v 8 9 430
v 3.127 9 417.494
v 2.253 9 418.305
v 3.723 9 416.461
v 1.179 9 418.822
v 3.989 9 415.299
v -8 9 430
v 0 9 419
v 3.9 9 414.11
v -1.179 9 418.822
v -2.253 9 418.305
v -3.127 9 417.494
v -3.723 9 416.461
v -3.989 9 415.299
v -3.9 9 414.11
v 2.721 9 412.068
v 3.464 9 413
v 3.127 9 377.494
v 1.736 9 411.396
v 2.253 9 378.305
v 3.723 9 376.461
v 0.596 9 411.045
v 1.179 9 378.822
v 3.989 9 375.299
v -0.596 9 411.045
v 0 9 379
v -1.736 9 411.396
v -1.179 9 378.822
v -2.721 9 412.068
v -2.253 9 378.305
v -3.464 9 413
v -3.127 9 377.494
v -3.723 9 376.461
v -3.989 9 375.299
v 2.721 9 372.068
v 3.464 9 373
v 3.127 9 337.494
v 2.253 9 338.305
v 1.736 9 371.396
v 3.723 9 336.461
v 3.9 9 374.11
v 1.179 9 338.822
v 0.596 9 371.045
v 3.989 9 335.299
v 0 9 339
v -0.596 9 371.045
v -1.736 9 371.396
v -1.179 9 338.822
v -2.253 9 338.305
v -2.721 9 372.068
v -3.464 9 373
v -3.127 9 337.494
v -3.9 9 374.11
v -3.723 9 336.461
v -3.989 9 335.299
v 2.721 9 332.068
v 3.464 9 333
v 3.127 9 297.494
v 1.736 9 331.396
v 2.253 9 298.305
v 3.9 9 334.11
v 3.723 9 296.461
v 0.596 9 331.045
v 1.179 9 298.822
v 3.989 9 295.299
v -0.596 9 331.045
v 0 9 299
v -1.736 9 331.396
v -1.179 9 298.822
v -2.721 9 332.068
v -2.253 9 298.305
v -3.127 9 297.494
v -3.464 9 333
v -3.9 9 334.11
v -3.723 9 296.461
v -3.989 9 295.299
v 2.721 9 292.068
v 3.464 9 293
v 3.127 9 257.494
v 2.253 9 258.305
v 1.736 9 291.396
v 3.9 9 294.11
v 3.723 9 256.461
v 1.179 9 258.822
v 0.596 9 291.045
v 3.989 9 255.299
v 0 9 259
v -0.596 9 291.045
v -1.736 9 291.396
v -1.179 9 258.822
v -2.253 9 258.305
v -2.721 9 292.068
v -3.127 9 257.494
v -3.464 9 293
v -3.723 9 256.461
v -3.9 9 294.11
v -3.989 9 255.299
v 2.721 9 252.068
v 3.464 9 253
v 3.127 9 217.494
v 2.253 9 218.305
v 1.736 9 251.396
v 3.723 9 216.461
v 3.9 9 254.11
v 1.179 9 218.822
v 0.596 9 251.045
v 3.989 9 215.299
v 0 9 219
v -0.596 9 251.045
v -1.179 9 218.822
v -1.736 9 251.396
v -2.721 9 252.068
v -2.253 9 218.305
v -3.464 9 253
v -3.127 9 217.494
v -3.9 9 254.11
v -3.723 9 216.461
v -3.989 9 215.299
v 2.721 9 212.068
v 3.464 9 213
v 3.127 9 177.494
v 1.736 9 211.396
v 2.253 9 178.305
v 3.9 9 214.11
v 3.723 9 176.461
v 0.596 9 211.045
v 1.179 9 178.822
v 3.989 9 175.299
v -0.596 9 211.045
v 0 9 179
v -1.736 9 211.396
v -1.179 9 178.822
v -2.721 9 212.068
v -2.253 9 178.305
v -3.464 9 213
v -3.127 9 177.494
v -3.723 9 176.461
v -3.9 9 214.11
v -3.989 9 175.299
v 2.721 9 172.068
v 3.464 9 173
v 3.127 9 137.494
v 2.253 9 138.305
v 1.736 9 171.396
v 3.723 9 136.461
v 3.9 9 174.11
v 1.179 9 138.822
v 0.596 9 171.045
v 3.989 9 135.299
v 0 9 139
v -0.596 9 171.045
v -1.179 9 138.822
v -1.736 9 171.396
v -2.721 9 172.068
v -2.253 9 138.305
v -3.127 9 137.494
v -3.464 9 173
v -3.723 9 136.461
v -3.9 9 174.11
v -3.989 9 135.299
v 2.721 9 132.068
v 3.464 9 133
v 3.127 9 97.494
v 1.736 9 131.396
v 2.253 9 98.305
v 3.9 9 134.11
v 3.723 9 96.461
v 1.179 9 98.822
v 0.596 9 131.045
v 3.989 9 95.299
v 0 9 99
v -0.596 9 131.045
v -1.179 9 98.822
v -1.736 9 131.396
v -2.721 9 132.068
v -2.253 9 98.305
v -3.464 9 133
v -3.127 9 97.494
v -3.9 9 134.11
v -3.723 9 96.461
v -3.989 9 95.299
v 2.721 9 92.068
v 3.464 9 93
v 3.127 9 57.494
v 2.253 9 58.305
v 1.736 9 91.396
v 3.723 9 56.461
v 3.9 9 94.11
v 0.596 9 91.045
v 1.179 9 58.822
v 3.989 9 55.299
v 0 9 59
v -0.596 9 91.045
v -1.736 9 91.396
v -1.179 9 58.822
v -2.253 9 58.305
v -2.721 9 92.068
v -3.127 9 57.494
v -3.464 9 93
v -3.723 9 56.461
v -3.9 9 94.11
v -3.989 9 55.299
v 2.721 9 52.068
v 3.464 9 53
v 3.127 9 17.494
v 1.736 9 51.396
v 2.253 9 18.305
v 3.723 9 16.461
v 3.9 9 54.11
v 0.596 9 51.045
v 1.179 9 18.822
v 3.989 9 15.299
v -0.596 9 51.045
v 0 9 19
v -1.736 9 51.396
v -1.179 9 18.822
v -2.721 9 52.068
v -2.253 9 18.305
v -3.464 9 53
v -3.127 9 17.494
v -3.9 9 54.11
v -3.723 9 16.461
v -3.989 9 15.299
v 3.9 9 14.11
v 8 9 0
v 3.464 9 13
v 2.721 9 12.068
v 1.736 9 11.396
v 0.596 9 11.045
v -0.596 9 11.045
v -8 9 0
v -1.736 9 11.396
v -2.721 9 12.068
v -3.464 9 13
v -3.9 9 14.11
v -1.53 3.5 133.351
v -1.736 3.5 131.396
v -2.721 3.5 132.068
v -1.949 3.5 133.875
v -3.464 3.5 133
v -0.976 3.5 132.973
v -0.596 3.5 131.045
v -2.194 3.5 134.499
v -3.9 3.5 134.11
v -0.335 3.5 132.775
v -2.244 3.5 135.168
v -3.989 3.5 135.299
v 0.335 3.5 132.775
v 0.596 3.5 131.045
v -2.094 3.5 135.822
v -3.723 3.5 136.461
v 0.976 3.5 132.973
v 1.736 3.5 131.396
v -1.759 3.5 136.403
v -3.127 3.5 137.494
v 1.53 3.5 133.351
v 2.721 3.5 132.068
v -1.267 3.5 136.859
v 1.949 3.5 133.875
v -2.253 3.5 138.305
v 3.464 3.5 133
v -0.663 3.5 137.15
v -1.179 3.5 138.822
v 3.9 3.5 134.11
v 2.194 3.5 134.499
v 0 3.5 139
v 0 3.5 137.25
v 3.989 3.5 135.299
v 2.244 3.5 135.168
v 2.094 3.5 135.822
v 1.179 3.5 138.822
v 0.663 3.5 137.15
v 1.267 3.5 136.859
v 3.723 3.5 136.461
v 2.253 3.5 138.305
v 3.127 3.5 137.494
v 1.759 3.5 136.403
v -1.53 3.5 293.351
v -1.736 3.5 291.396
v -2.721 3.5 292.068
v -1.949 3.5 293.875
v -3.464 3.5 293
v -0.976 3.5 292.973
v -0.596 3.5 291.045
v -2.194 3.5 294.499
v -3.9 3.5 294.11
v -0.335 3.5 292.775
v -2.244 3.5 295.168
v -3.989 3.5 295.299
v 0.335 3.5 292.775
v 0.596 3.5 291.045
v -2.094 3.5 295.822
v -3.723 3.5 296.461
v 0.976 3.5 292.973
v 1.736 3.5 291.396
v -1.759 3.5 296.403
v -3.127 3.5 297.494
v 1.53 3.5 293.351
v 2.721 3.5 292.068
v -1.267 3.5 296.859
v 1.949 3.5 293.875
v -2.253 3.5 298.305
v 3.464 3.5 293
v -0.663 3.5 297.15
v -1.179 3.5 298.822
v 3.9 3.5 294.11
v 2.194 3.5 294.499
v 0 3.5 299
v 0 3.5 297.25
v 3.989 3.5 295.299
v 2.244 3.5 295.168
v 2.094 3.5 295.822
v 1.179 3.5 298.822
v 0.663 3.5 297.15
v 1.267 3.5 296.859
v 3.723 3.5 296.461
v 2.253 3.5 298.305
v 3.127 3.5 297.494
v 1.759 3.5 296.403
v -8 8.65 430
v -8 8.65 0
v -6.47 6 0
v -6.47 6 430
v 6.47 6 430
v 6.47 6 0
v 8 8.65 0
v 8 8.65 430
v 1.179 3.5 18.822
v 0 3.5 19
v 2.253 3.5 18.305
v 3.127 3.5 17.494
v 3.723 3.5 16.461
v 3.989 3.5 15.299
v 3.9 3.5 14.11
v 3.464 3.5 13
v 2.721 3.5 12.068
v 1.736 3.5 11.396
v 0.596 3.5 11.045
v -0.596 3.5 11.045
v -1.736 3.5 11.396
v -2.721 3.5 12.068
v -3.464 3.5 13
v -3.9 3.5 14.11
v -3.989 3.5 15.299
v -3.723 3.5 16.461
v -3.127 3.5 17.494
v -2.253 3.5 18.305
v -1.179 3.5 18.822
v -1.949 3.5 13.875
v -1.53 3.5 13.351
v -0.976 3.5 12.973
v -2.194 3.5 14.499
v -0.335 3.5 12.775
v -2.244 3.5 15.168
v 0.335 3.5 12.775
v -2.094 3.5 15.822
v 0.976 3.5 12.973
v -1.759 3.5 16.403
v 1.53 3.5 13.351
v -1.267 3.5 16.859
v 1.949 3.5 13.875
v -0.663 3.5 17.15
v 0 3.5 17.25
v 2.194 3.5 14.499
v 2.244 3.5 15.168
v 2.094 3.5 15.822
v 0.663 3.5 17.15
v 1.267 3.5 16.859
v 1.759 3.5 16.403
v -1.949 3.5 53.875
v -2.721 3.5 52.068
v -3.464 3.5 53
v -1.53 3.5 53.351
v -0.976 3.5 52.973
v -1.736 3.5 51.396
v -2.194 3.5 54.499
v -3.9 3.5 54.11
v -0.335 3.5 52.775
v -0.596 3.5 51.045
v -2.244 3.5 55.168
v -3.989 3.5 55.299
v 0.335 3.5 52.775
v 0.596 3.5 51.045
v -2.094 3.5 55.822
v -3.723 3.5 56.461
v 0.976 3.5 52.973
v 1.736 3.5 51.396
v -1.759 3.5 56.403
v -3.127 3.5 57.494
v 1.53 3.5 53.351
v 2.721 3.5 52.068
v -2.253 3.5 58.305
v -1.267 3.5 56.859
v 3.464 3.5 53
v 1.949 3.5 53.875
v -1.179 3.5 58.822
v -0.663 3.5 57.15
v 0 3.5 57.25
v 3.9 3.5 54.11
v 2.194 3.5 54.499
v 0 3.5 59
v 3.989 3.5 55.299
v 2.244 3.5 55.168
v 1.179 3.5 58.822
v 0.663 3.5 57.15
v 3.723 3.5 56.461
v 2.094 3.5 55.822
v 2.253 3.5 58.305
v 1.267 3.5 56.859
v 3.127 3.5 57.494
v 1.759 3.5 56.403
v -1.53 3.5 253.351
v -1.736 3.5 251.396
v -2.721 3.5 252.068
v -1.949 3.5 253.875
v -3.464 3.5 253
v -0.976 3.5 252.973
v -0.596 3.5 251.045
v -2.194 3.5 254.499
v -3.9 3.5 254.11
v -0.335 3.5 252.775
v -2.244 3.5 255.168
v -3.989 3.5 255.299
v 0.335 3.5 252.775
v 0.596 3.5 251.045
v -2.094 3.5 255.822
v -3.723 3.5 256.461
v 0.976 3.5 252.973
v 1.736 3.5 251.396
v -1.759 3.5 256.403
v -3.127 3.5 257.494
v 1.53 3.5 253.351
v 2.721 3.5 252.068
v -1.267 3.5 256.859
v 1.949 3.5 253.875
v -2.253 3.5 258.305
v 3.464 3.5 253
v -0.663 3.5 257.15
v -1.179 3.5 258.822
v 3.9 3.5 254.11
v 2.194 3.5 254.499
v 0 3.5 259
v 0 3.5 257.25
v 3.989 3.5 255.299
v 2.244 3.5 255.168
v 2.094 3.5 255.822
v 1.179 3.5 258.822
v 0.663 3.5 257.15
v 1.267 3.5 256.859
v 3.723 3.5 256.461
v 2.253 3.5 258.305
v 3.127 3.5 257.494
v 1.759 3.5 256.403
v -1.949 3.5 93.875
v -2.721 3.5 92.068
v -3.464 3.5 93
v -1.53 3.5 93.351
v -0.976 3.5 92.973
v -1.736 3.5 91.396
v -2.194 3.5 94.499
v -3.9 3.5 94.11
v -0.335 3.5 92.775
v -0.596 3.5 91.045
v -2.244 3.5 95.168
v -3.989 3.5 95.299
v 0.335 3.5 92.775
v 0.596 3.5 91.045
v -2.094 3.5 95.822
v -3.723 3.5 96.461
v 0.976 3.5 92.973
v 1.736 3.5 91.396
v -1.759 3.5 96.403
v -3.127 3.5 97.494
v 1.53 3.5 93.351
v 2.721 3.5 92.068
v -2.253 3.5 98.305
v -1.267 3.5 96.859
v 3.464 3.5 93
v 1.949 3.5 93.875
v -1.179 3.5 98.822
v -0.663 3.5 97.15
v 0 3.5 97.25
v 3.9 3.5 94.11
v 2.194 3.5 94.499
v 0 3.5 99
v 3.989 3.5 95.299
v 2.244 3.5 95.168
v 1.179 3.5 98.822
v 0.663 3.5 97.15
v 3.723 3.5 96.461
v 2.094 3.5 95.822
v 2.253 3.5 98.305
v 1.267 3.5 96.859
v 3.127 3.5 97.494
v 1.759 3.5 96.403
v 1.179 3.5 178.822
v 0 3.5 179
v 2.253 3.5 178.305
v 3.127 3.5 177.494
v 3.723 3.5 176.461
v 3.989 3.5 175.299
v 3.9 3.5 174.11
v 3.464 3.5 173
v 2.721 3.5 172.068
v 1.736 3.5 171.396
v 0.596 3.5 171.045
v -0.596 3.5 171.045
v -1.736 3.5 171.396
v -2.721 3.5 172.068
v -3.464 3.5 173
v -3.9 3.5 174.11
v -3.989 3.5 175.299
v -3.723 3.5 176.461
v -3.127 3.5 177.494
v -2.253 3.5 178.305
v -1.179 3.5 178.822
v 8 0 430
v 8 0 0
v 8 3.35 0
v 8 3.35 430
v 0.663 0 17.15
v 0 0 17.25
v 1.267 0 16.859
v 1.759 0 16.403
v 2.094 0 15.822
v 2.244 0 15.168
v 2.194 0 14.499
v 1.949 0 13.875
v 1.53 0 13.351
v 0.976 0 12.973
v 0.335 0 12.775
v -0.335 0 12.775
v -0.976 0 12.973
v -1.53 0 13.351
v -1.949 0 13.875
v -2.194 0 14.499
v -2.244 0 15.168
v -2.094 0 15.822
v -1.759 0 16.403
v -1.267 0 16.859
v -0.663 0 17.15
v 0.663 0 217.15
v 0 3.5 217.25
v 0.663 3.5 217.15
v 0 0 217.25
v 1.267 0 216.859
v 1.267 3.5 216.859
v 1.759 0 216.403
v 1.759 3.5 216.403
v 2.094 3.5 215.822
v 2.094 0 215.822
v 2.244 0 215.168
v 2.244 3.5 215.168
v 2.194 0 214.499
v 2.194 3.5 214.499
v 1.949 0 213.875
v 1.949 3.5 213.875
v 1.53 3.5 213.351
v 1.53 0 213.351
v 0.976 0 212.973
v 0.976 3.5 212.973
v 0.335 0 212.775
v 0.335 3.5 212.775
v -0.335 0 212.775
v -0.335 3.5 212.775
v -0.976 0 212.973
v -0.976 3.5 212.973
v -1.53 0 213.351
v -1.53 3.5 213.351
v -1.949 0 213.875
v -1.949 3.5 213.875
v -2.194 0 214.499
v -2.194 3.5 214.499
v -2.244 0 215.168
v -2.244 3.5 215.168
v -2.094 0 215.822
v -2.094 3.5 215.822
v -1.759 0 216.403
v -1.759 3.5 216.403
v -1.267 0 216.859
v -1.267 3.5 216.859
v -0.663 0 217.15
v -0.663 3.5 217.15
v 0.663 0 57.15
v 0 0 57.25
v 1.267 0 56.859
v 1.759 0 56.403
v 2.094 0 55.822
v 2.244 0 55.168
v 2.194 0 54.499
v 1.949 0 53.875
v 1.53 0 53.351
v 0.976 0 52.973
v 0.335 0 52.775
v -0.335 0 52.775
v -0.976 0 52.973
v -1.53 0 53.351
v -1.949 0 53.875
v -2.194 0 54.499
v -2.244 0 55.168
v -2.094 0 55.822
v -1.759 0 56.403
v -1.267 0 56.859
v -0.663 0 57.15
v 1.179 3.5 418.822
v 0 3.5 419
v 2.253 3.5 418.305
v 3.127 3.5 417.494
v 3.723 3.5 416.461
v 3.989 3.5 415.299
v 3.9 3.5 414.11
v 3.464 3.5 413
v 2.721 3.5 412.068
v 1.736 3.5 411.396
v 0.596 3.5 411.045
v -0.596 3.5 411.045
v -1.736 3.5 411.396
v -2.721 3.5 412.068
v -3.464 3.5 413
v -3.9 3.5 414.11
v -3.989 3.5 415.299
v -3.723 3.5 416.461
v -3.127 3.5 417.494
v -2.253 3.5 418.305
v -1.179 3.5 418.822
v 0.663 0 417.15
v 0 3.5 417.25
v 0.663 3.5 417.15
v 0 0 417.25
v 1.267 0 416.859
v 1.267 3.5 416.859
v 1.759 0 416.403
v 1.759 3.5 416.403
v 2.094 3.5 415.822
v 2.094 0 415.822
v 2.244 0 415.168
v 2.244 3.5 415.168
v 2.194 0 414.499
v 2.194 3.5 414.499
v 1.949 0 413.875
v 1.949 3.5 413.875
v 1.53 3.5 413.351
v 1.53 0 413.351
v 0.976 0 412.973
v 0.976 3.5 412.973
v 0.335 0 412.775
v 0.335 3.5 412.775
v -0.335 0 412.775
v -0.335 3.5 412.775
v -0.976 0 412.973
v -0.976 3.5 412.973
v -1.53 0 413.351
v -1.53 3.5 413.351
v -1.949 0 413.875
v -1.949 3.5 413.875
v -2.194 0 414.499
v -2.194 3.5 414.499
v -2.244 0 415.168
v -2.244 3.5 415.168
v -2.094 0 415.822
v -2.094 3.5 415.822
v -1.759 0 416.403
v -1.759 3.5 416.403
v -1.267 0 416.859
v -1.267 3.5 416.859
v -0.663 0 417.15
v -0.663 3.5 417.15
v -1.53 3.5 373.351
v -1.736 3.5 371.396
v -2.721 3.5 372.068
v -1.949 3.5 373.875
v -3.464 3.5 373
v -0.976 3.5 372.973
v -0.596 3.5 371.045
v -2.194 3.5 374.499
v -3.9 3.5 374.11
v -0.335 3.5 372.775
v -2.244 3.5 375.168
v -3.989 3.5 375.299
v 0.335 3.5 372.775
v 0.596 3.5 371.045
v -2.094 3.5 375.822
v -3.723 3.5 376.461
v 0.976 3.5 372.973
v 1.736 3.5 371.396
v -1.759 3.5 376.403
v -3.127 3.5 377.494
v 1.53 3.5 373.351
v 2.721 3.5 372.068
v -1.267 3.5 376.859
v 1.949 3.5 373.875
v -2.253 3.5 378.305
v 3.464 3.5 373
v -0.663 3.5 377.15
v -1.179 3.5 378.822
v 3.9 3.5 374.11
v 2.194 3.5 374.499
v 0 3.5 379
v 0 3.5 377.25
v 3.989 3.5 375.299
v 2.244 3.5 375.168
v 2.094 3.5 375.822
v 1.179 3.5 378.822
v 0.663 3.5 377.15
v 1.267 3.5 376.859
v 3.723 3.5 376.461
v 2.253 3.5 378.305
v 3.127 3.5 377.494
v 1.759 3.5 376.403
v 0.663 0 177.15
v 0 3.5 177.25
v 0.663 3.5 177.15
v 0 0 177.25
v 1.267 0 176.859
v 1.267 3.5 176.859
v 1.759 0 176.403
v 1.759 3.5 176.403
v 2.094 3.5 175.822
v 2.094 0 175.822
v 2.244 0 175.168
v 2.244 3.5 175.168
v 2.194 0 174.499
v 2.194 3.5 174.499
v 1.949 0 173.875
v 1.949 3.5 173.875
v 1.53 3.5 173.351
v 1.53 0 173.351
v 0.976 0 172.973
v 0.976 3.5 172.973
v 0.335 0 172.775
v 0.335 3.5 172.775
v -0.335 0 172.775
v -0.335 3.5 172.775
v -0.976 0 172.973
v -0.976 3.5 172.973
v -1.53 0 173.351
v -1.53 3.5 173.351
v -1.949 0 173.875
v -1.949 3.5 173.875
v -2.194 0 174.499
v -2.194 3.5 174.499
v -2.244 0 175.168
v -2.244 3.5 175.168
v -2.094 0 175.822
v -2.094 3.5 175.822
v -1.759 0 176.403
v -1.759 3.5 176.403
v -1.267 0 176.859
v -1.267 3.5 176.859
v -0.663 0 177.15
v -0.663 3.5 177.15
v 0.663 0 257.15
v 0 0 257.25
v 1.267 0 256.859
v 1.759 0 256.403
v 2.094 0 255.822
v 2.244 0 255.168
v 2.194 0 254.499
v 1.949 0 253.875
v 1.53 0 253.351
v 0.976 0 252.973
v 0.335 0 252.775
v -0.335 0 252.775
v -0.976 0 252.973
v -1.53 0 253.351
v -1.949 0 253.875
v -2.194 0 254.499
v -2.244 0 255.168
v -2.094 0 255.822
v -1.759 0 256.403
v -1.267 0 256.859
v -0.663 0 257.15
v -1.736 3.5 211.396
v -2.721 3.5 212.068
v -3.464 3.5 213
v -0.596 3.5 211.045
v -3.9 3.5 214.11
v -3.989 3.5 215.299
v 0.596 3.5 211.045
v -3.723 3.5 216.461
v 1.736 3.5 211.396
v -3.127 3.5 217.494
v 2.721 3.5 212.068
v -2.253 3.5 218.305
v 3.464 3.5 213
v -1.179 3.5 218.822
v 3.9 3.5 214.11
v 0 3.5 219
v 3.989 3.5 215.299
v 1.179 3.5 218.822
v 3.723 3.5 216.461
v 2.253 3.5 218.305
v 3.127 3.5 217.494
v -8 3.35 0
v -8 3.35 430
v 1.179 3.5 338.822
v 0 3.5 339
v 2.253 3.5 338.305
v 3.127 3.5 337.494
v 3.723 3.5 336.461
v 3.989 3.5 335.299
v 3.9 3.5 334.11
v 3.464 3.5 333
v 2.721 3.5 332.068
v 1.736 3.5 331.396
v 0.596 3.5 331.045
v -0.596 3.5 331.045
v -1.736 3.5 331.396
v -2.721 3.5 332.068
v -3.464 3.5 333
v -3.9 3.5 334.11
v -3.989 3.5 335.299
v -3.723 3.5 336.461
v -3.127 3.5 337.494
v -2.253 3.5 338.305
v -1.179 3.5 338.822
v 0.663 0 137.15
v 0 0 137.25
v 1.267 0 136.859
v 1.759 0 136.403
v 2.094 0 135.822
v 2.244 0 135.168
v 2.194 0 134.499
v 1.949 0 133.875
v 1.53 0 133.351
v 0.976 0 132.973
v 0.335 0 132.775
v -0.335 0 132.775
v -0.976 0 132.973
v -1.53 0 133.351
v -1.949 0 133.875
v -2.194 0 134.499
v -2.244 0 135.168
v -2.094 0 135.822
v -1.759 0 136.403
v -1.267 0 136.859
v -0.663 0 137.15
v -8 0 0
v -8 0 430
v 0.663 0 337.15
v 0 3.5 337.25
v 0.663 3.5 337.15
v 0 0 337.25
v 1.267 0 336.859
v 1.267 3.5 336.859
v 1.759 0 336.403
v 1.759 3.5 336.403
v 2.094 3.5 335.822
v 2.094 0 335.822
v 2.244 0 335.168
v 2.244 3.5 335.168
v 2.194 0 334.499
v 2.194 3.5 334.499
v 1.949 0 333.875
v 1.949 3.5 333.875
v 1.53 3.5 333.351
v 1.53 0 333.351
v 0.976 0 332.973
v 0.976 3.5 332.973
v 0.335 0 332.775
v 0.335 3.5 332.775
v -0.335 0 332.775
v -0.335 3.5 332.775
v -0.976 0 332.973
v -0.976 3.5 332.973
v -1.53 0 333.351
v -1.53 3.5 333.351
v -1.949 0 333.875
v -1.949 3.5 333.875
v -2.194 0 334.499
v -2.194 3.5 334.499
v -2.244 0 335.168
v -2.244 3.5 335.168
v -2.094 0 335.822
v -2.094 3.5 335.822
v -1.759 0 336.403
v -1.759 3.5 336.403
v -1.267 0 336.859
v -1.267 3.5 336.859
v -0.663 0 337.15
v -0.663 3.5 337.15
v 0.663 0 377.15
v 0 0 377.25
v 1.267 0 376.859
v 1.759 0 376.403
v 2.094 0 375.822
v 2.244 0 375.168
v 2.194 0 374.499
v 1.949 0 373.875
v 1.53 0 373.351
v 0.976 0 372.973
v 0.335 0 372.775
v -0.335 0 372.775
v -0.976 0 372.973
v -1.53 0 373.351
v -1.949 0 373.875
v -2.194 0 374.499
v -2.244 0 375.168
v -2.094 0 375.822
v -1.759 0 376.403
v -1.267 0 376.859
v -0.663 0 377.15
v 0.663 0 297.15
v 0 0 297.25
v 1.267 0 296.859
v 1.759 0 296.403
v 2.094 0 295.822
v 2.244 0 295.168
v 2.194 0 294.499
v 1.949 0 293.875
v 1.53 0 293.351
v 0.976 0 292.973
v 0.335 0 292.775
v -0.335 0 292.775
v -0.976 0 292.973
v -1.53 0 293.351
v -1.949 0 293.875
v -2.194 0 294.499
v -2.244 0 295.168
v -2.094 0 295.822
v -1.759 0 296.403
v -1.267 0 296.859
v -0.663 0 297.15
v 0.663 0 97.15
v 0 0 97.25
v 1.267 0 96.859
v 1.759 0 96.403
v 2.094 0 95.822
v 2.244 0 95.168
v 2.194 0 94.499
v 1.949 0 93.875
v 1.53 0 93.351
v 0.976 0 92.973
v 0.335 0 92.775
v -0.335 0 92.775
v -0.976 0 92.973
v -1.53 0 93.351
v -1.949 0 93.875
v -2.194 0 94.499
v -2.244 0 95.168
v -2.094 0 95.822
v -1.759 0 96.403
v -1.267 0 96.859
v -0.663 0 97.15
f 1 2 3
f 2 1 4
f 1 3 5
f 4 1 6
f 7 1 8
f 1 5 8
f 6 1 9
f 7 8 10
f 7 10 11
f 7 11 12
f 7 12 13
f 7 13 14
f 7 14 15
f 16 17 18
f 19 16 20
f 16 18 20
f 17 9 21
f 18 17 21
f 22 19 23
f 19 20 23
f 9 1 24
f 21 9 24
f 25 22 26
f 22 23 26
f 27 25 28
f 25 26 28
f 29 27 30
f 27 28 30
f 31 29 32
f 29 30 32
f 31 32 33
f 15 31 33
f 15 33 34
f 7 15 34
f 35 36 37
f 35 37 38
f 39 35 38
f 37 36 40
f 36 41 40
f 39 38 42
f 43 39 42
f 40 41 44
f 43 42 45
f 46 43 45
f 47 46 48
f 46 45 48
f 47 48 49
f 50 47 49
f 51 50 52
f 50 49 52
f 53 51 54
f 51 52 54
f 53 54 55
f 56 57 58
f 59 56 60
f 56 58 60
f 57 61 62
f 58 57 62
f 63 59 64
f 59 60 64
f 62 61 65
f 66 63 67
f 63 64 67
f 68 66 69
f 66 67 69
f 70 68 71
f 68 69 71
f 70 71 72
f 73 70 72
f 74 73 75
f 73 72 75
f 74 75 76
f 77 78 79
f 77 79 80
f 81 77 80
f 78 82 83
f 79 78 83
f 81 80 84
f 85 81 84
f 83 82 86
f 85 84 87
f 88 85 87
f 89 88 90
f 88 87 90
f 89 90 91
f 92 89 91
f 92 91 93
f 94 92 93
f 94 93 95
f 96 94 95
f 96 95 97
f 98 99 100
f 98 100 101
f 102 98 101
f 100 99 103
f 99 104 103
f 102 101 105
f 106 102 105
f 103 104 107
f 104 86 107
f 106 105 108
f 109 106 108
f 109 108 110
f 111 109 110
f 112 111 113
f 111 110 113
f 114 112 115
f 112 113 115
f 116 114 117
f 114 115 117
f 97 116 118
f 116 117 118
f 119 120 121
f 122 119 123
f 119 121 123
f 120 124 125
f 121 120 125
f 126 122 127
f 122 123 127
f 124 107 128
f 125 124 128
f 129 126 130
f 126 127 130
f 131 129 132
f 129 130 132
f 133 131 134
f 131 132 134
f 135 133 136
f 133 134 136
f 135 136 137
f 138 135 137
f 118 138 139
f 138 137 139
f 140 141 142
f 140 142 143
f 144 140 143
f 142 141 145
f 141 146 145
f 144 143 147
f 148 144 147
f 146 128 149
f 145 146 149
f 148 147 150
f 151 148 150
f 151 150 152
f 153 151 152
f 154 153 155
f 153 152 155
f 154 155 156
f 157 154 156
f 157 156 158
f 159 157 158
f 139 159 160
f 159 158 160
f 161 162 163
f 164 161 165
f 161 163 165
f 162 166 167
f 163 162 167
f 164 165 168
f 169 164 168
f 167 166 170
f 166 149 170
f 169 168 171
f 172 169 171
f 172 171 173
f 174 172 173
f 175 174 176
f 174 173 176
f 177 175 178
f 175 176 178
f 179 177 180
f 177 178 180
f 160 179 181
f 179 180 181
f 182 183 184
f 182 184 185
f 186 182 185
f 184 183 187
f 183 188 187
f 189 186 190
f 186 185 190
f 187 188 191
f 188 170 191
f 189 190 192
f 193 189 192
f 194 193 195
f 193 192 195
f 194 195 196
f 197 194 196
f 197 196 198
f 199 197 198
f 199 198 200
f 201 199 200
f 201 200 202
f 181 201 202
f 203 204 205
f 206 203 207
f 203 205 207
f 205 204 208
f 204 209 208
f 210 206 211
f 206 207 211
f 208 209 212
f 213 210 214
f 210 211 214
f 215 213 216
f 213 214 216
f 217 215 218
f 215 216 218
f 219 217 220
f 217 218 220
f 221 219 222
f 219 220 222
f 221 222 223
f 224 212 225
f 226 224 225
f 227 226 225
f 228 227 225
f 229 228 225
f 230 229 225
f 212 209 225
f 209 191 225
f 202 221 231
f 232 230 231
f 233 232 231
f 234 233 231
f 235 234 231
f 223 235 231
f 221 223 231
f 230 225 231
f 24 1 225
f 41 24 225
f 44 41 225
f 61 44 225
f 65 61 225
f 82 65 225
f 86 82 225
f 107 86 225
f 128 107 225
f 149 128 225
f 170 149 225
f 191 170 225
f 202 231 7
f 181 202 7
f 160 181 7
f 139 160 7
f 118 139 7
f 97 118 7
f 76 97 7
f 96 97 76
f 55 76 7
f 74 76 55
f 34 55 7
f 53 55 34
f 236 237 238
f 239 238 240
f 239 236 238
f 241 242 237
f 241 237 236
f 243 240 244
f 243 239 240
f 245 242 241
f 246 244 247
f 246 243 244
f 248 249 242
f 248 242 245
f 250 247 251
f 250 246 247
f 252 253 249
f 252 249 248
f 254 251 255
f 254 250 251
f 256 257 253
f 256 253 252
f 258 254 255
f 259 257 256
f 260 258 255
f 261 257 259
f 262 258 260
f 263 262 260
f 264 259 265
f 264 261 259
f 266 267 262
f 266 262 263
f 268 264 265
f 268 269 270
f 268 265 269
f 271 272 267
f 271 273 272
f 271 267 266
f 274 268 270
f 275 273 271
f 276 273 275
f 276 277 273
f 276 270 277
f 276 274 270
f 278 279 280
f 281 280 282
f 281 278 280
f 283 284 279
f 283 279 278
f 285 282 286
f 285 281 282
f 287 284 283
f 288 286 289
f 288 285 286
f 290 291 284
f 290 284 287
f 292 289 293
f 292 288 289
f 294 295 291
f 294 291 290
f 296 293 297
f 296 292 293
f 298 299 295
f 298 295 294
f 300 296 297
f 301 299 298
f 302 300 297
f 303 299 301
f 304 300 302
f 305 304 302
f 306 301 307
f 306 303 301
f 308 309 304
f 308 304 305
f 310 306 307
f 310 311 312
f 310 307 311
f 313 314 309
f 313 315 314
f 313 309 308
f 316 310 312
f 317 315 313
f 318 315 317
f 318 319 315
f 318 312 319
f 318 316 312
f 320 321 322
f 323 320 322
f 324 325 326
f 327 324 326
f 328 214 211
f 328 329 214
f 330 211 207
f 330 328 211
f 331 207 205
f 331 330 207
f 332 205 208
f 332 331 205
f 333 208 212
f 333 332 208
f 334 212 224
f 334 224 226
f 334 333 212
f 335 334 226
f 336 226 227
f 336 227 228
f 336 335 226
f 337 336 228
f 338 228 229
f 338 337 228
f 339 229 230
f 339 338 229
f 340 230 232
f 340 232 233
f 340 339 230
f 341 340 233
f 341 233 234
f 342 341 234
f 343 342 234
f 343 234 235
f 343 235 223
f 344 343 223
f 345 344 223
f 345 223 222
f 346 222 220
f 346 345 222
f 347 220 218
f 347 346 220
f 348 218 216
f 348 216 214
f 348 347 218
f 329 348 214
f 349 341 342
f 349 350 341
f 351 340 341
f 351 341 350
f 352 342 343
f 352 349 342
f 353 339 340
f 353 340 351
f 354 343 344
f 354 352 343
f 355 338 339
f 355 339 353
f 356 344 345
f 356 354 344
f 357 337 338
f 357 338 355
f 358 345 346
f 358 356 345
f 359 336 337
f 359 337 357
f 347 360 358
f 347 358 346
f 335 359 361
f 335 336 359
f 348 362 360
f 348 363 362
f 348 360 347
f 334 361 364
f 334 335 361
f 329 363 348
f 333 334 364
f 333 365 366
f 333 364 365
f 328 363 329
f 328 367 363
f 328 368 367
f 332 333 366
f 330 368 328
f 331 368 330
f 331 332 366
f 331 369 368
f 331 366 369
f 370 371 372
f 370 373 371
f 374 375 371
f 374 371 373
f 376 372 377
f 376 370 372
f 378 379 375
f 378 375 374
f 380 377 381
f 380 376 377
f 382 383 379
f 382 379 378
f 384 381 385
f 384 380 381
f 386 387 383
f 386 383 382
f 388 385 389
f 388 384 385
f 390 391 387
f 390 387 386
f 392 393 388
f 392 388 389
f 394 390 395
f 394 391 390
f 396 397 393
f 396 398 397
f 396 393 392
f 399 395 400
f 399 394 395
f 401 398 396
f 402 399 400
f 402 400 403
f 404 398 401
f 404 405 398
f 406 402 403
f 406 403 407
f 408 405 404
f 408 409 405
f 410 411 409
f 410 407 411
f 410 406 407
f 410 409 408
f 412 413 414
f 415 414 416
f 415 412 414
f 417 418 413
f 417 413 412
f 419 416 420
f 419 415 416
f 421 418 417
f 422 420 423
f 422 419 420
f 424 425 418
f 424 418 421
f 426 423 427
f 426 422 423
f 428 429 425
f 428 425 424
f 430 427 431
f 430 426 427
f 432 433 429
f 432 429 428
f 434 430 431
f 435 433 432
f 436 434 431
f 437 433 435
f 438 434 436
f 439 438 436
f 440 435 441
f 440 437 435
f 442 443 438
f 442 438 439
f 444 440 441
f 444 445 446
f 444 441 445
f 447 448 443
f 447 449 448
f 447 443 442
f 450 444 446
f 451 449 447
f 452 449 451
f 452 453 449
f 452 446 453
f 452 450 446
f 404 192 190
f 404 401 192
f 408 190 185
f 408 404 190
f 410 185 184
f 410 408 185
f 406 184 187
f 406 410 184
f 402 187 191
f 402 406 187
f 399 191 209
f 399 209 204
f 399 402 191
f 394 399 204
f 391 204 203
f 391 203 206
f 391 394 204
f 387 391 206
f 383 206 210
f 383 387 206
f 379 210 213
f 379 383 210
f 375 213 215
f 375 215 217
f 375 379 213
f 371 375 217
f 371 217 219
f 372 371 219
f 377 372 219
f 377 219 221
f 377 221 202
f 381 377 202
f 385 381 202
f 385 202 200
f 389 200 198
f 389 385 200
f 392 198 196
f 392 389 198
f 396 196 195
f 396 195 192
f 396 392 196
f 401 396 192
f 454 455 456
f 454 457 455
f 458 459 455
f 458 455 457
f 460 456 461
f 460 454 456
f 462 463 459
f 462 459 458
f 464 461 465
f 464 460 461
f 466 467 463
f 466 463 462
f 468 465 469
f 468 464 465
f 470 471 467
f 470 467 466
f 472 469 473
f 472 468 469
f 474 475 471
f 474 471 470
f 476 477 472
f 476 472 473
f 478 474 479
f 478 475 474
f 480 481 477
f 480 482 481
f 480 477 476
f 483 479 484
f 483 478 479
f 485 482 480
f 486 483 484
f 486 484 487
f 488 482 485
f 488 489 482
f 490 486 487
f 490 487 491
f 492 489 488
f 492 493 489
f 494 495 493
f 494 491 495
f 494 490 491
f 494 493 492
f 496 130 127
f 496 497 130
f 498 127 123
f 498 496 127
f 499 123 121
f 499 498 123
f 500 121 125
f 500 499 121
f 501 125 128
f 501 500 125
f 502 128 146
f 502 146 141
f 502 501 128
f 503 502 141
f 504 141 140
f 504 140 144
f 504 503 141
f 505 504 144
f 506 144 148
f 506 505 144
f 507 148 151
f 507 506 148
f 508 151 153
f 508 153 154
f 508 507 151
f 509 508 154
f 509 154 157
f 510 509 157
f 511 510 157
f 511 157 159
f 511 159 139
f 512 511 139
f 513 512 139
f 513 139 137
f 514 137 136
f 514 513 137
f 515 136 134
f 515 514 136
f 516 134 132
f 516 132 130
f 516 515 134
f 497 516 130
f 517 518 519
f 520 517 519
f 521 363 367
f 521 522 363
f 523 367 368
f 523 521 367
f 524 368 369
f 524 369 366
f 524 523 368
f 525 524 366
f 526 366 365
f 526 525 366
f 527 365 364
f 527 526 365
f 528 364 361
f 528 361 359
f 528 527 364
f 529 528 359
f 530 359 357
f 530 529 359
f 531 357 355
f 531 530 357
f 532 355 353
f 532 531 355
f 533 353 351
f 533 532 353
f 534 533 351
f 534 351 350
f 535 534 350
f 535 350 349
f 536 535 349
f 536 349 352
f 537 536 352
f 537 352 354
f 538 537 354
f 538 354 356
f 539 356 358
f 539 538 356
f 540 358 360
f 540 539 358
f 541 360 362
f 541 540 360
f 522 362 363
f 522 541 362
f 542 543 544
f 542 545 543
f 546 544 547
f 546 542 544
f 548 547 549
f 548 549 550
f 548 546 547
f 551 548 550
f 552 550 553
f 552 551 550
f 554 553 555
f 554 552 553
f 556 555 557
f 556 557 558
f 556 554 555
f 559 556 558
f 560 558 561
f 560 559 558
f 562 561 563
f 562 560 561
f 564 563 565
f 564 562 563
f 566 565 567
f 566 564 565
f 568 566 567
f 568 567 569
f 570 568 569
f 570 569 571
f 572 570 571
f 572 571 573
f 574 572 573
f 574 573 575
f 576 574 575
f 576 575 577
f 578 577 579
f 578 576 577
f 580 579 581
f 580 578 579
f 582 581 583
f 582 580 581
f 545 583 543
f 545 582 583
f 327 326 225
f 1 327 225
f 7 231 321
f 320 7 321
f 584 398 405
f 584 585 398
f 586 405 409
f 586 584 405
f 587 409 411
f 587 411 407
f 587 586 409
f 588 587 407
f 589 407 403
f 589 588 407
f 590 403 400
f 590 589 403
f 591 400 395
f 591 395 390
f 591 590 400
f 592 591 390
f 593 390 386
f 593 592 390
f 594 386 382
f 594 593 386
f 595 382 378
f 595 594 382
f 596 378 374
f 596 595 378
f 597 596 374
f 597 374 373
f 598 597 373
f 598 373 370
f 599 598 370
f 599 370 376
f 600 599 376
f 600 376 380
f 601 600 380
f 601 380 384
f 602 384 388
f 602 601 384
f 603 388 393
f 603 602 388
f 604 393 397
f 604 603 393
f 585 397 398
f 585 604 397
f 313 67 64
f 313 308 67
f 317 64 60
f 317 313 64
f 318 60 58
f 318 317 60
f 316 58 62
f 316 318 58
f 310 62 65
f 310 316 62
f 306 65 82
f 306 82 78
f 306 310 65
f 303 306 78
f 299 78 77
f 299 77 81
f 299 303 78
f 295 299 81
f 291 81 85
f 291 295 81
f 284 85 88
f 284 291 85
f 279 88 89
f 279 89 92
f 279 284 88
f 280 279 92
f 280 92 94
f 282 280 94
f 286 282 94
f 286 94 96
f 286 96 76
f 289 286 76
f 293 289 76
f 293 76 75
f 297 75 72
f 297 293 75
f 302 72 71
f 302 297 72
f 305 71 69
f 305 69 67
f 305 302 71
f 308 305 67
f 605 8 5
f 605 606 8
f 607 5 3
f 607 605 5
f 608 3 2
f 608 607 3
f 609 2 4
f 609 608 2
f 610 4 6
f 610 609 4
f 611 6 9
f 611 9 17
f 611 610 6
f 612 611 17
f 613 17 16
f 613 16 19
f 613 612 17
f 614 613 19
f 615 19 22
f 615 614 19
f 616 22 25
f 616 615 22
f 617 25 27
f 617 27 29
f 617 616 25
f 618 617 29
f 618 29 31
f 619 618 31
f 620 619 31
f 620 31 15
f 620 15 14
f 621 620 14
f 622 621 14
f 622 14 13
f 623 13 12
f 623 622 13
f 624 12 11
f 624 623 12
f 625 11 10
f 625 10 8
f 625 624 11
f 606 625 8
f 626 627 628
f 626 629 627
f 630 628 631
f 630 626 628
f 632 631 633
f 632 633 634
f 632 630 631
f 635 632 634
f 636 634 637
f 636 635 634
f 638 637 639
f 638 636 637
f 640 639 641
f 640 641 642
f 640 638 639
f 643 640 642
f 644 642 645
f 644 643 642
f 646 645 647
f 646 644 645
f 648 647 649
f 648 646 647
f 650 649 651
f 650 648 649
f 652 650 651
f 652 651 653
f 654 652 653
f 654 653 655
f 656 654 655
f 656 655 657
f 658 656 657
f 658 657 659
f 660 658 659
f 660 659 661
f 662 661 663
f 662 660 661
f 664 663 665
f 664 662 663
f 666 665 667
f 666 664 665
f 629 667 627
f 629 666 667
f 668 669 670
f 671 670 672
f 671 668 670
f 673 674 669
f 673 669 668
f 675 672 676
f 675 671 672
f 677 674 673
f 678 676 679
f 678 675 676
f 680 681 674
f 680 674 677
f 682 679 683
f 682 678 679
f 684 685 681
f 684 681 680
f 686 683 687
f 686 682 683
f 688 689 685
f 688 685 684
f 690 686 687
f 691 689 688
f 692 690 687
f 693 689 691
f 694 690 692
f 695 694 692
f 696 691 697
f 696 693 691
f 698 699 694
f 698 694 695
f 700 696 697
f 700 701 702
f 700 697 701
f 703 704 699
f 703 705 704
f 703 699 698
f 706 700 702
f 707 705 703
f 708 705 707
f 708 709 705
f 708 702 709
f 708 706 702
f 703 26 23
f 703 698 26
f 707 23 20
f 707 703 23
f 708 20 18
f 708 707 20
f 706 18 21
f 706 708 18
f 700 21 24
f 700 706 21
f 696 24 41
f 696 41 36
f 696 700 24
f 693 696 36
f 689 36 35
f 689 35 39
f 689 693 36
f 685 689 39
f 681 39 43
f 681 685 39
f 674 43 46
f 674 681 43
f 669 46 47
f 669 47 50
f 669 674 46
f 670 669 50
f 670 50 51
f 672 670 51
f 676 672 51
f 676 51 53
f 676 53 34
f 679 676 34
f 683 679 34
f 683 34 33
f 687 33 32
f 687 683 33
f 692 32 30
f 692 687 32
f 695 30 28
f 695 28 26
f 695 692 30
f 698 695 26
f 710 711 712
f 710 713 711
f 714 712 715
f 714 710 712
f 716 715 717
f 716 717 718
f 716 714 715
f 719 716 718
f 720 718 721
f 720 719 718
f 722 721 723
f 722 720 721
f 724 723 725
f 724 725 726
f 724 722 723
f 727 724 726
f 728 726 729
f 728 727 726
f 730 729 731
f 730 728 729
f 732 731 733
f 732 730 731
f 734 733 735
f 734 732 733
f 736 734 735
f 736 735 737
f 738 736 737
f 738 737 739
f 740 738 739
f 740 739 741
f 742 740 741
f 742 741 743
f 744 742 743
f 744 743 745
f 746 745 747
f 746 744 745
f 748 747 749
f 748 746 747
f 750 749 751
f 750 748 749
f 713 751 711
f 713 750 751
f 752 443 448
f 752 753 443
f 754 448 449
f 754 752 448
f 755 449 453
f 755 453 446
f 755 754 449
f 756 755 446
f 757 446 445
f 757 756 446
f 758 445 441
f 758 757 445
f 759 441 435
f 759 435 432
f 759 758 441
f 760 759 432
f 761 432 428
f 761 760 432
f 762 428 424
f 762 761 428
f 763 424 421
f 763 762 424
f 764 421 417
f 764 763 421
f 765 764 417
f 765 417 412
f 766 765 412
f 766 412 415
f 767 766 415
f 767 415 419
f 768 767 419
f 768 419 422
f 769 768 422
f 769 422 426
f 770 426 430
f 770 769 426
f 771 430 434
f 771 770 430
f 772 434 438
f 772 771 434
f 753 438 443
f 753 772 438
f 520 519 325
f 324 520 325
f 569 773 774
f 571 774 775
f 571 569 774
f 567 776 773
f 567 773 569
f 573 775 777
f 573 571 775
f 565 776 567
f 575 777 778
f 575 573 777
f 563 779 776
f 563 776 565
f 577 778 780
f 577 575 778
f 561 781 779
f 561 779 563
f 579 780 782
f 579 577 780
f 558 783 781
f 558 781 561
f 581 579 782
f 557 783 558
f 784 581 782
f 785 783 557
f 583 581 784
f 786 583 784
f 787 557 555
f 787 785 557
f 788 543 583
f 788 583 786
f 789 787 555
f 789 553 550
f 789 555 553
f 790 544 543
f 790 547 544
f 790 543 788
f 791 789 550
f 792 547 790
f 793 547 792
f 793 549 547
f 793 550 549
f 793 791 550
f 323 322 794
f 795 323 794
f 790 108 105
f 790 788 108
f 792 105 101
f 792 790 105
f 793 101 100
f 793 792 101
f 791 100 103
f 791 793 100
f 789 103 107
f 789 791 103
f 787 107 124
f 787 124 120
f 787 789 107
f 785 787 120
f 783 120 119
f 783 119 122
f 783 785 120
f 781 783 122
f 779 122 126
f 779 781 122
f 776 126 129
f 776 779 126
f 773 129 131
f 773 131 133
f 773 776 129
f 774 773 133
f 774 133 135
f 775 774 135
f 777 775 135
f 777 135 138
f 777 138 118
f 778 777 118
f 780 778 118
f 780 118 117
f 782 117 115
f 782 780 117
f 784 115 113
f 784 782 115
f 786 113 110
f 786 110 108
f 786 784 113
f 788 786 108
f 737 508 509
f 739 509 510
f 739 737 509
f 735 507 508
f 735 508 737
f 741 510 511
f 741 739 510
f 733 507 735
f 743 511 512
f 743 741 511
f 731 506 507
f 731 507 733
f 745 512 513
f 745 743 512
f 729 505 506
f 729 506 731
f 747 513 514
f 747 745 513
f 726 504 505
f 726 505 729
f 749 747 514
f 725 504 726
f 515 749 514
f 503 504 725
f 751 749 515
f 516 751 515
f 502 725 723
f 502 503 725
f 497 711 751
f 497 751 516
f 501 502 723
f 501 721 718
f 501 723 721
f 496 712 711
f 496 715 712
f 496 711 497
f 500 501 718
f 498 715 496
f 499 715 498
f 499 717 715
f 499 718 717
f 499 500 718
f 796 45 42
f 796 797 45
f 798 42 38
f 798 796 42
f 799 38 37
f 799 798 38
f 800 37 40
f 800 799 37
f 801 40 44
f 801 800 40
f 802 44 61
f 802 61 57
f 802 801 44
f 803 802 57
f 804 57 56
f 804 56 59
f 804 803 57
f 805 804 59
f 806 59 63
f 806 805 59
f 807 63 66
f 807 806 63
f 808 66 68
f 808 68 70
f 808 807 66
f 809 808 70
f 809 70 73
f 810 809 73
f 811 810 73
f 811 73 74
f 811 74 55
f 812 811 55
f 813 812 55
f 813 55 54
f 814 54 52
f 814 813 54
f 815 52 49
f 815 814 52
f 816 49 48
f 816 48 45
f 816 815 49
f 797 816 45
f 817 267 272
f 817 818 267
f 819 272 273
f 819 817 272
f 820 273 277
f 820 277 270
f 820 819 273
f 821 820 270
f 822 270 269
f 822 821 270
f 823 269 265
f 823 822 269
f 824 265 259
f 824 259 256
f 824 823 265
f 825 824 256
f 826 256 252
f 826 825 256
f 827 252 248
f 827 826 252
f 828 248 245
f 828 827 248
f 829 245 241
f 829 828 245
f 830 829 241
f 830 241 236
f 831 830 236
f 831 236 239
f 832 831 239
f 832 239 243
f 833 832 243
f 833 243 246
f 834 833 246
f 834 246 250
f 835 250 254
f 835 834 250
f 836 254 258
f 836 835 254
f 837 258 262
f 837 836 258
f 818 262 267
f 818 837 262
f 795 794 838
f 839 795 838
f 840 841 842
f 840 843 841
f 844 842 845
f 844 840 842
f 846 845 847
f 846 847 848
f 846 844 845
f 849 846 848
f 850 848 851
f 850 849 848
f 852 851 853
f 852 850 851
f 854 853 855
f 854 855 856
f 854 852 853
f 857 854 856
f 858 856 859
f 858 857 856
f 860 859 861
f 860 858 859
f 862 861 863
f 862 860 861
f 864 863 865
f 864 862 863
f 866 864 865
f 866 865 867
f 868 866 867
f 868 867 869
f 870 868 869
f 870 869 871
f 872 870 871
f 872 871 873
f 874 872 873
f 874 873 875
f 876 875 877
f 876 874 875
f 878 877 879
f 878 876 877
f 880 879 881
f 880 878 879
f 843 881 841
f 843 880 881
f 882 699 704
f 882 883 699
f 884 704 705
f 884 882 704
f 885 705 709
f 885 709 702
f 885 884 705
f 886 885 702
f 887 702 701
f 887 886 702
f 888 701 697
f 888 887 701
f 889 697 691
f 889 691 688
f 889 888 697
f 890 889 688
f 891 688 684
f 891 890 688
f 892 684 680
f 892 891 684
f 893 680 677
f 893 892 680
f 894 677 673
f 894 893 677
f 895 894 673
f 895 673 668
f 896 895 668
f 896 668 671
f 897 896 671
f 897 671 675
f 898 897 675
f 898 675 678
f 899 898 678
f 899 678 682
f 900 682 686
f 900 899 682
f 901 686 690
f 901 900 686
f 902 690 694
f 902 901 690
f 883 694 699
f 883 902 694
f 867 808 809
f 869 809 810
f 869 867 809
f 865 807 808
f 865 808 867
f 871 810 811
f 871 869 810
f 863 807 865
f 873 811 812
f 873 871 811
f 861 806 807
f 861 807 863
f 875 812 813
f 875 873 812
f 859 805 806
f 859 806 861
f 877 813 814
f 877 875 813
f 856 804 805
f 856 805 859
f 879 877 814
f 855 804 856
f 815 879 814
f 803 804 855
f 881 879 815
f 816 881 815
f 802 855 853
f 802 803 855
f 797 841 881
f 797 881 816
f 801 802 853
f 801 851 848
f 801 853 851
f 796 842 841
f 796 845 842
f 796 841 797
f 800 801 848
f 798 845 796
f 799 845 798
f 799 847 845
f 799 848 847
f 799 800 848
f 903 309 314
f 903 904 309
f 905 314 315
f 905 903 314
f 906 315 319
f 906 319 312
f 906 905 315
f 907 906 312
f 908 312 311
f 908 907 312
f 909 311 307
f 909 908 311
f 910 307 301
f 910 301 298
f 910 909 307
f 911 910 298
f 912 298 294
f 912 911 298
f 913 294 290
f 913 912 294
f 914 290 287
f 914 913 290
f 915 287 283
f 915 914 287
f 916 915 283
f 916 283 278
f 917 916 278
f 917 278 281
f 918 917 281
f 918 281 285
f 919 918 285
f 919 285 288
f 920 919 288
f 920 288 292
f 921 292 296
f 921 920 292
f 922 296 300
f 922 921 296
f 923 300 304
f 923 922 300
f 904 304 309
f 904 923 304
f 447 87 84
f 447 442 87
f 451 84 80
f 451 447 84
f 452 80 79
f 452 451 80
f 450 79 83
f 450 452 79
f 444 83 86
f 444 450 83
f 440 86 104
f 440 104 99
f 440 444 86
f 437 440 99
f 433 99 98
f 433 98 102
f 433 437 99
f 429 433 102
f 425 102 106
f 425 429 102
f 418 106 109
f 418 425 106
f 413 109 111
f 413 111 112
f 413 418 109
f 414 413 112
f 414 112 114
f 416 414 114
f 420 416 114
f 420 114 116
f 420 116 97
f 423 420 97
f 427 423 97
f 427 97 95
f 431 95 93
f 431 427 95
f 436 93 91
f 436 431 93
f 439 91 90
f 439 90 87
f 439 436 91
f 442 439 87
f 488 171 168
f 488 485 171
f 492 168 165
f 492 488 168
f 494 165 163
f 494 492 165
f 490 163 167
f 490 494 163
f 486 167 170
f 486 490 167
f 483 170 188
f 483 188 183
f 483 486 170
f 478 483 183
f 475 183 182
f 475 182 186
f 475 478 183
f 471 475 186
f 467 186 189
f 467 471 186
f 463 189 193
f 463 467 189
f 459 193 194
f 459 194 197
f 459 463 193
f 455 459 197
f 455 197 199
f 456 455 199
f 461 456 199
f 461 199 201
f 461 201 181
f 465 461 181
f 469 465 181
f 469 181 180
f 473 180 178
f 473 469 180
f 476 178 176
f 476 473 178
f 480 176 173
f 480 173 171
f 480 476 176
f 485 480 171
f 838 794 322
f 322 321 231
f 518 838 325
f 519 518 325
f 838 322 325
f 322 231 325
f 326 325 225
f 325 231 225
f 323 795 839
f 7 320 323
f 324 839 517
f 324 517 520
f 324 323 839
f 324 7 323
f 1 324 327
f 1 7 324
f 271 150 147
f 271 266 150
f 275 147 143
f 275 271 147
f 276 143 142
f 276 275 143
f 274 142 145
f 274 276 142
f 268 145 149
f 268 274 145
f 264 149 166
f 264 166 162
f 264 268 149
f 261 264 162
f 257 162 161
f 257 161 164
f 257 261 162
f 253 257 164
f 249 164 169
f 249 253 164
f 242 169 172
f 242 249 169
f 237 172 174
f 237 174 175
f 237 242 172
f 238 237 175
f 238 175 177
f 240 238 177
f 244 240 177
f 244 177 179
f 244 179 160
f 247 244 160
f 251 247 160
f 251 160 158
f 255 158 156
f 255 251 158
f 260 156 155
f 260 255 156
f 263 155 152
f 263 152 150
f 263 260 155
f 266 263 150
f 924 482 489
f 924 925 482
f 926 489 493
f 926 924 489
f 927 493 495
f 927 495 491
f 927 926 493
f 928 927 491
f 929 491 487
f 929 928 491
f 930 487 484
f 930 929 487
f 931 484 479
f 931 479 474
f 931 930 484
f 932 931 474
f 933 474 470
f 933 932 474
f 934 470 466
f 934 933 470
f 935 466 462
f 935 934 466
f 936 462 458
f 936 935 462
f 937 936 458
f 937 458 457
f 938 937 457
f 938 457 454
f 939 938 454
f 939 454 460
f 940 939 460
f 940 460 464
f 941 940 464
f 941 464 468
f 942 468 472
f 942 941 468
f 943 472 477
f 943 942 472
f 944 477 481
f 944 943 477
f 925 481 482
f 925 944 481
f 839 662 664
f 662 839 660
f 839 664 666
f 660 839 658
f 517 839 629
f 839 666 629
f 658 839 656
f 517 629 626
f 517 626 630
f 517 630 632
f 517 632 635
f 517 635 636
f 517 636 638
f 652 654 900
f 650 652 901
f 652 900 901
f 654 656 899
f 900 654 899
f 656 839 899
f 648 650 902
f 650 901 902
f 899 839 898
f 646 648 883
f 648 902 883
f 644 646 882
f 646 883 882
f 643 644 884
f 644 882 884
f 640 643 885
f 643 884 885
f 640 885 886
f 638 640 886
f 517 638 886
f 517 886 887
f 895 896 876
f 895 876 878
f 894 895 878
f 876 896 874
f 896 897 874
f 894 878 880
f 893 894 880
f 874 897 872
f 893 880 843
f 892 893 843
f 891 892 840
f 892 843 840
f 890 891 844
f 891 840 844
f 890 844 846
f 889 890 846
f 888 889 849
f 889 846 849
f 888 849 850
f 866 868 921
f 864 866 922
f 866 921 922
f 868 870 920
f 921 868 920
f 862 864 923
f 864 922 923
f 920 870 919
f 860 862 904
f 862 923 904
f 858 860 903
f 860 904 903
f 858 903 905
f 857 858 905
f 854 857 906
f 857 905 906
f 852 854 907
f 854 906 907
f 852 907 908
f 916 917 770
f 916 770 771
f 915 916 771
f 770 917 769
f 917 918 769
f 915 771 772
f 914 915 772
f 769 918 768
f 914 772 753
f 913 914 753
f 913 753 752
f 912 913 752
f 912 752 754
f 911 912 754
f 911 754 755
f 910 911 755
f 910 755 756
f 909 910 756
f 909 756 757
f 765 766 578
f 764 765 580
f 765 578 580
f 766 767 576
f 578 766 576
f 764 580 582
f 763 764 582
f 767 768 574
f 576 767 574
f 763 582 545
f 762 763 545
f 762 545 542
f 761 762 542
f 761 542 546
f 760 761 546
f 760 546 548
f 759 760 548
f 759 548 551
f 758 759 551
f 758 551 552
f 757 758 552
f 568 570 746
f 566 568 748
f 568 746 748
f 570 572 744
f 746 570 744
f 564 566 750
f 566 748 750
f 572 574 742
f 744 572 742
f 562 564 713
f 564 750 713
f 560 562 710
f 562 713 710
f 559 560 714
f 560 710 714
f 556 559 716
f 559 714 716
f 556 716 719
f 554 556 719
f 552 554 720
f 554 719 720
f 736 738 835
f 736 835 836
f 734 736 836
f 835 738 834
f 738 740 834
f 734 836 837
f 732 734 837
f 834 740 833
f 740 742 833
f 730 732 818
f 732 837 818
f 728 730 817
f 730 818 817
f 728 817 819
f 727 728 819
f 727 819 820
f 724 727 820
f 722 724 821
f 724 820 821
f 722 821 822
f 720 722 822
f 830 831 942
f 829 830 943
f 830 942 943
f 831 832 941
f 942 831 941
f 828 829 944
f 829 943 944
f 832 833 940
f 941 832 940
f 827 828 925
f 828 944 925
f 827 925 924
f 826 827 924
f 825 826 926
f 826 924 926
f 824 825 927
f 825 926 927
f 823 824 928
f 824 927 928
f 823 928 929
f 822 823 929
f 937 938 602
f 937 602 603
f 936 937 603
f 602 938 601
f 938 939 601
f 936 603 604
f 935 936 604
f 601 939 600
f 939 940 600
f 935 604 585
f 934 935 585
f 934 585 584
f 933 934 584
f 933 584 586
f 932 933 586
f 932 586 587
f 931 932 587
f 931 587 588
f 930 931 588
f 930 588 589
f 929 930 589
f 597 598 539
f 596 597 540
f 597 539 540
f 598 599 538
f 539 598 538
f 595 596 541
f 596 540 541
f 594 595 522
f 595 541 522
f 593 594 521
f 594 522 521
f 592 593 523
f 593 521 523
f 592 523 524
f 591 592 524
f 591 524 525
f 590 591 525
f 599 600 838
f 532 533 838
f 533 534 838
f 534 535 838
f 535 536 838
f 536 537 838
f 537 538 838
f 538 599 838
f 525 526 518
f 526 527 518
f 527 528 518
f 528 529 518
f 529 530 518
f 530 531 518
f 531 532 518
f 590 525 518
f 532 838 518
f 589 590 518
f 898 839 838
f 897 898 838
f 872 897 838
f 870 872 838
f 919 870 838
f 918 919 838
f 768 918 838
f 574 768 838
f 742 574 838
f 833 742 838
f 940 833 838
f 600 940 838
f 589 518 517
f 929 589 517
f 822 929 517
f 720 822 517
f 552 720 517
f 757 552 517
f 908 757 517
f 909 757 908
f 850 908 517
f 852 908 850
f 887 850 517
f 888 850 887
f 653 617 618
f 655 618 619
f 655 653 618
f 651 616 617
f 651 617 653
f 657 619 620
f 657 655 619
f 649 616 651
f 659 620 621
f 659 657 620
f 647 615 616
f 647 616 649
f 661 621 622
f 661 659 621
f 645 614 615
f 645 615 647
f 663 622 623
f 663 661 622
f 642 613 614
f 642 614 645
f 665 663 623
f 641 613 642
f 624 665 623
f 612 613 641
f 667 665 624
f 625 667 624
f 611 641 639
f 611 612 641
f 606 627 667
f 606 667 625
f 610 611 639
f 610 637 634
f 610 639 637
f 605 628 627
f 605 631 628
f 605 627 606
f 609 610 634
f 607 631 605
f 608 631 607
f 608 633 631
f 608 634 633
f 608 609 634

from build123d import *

# Parameters (mm, degrees)
BOSS_EXTRUDE1_DEPTH = 430


with BuildPart() as part:
    # Sketch1 → Boss-Extrude1 (new body)
    with BuildSketch(Plane.XY):
        Polygon((-8, 0), (8, 0), (8, 3.35), (6.47, 6), (8, 8.65), (8, 9), (-8, 9), (-8, 8.65), (-6.47, 6), (-8, 3.35), align=None)
    extrude(amount=BOSS_EXTRUDE1_DEPTH)

    # Sketch2 → Cut-Revolve1 (revolve, cut)
    with BuildSketch(Plane.XY.offset(15), mode=Mode.PRIVATE) as cut_revolve1_sk:
        Polygon((0, 9), (4, 9), (4, 3.5), (2.25, 3.5), (2.25, 0), (0, 0), align=None)
    revolve(cut_revolve1_sk.sketch.rotate(Axis((0, 0, 15), (0, 1, 0)), 270), axis=Axis((0, 0, 15), (0, 1, 0)), mode=Mode.SUBTRACT)

    # Sketch3 → Cut-Revolve2 (revolve, cut)
    with BuildSketch(Plane.XY.offset(55), mode=Mode.PRIVATE) as cut_revolve2_sk:
        Polygon((0, 9), (4, 9), (4, 3.5), (2.25, 3.5), (2.25, 0), (0, 0), align=None)
    revolve(cut_revolve2_sk.sketch.rotate(Axis((0, 0, 55), (0, 1, 0)), 270), axis=Axis((0, 0, 55), (0, 1, 0)), mode=Mode.SUBTRACT)

    # Sketch4 → Cut-Revolve3 (revolve, cut)
    with BuildSketch(Plane.XY.offset(95), mode=Mode.PRIVATE) as cut_revolve3_sk:
        Polygon((0, 9), (4, 9), (4, 3.5), (2.25, 3.5), (2.25, 0), (0, 0), align=None)
    revolve(cut_revolve3_sk.sketch.rotate(Axis((0, 0, 95), (0, 1, 0)), 270), axis=Axis((0, 0, 95), (0, 1, 0)), mode=Mode.SUBTRACT)

    # Sketch5 → Cut-Revolve4 (revolve, cut)
    with BuildSketch(Plane.XY.offset(135), mode=Mode.PRIVATE) as cut_revolve4_sk:
        Polygon((0, 9), (4, 9), (4, 3.5), (2.25, 3.5), (2.25, 0), (0, 0), align=None)
    revolve(cut_revolve4_sk.sketch.rotate(Axis((0, 0, 135), (0, 1, 0)), 270), axis=Axis((0, 0, 135), (0, 1, 0)), mode=Mode.SUBTRACT)

    # Sketch6 → Cut-Revolve5 (revolve, cut)
    with BuildSketch(Plane.XY.offset(175), mode=Mode.PRIVATE) as cut_revolve5_sk:
        Polygon((0, 9), (4, 9), (4, 3.5), (2.25, 3.5), (2.25, 0), (0, 0), align=None)
    revolve(cut_revolve5_sk.sketch.rotate(Axis((0, 0, 175), (0, 1, 0)), 270), axis=Axis((0, 0, 175), (0, 1, 0)), mode=Mode.SUBTRACT)

    # Sketch7 → Cut-Revolve6 (revolve, cut)
    with BuildSketch(Plane.XY.offset(215), mode=Mode.PRIVATE) as cut_revolve6_sk:
        Polygon((0, 9), (4, 9), (4, 3.5), (2.25, 3.5), (2.25, 0), (0, 0), align=None)
    revolve(cut_revolve6_sk.sketch.rotate(Axis((0, 0, 215), (0, 1, 0)), 270), axis=Axis((0, 0, 215), (0, 1, 0)), mode=Mode.SUBTRACT)

    # Sketch8 → Cut-Revolve7 (revolve, cut)
    with BuildSketch(Plane.XY.offset(255), mode=Mode.PRIVATE) as cut_revolve7_sk:
        Polygon((0, 9), (4, 9), (4, 3.5), (2.25, 3.5), (2.25, 0), (0, 0), align=None)
    revolve(cut_revolve7_sk.sketch.rotate(Axis((0, 0, 255), (0, 1, 0)), 270), axis=Axis((0, 0, 255), (0, 1, 0)), mode=Mode.SUBTRACT)

    # Sketch9 → Cut-Revolve8 (revolve, cut)
    with BuildSketch(Plane.XY.offset(295), mode=Mode.PRIVATE) as cut_revolve8_sk:
        Polygon((0, 9), (4, 9), (4, 3.5), (2.25, 3.5), (2.25, 0), (0, 0), align=None)
    revolve(cut_revolve8_sk.sketch.rotate(Axis((0, 0, 295), (0, 1, 0)), 270), axis=Axis((0, 0, 295), (0, 1, 0)), mode=Mode.SUBTRACT)

    # Sketch10 → Cut-Revolve9 (revolve, cut)
    with BuildSketch(Plane.XY.offset(335), mode=Mode.PRIVATE) as cut_revolve9_sk:
        Polygon((0, 9), (4, 9), (4, 3.5), (2.25, 3.5), (2.25, 0), (0, 0), align=None)
    revolve(cut_revolve9_sk.sketch.rotate(Axis((0, 0, 335), (0, 1, 0)), 270), axis=Axis((0, 0, 335), (0, 1, 0)), mode=Mode.SUBTRACT)

    # Sketch11 → Cut-Revolve10 (revolve, cut)
    with BuildSketch(Plane.XY.offset(375), mode=Mode.PRIVATE) as cut_revolve10_sk:
        Polygon((0, 9), (4, 9), (4, 3.5), (2.25, 3.5), (2.25, 0), (0, 0), align=None)
    revolve(cut_revolve10_sk.sketch.rotate(Axis((0, 0, 375), (0, 1, 0)), 270), axis=Axis((0, 0, 375), (0, 1, 0)), mode=Mode.SUBTRACT)

    # Sketch12 → Cut-Revolve11 (revolve, cut)
    with BuildSketch(Plane.XY.offset(415), mode=Mode.PRIVATE) as cut_revolve11_sk:
        Polygon((0, 9), (4, 9), (4, 3.5), (2.25, 3.5), (2.25, 0), (0, 0), align=None)
    revolve(cut_revolve11_sk.sketch.rotate(Axis((0, 0, 415), (0, 1, 0)), 270), axis=Axis((0, 0, 415), (0, 1, 0)), mode=Mode.SUBTRACT)


solid = part.part
